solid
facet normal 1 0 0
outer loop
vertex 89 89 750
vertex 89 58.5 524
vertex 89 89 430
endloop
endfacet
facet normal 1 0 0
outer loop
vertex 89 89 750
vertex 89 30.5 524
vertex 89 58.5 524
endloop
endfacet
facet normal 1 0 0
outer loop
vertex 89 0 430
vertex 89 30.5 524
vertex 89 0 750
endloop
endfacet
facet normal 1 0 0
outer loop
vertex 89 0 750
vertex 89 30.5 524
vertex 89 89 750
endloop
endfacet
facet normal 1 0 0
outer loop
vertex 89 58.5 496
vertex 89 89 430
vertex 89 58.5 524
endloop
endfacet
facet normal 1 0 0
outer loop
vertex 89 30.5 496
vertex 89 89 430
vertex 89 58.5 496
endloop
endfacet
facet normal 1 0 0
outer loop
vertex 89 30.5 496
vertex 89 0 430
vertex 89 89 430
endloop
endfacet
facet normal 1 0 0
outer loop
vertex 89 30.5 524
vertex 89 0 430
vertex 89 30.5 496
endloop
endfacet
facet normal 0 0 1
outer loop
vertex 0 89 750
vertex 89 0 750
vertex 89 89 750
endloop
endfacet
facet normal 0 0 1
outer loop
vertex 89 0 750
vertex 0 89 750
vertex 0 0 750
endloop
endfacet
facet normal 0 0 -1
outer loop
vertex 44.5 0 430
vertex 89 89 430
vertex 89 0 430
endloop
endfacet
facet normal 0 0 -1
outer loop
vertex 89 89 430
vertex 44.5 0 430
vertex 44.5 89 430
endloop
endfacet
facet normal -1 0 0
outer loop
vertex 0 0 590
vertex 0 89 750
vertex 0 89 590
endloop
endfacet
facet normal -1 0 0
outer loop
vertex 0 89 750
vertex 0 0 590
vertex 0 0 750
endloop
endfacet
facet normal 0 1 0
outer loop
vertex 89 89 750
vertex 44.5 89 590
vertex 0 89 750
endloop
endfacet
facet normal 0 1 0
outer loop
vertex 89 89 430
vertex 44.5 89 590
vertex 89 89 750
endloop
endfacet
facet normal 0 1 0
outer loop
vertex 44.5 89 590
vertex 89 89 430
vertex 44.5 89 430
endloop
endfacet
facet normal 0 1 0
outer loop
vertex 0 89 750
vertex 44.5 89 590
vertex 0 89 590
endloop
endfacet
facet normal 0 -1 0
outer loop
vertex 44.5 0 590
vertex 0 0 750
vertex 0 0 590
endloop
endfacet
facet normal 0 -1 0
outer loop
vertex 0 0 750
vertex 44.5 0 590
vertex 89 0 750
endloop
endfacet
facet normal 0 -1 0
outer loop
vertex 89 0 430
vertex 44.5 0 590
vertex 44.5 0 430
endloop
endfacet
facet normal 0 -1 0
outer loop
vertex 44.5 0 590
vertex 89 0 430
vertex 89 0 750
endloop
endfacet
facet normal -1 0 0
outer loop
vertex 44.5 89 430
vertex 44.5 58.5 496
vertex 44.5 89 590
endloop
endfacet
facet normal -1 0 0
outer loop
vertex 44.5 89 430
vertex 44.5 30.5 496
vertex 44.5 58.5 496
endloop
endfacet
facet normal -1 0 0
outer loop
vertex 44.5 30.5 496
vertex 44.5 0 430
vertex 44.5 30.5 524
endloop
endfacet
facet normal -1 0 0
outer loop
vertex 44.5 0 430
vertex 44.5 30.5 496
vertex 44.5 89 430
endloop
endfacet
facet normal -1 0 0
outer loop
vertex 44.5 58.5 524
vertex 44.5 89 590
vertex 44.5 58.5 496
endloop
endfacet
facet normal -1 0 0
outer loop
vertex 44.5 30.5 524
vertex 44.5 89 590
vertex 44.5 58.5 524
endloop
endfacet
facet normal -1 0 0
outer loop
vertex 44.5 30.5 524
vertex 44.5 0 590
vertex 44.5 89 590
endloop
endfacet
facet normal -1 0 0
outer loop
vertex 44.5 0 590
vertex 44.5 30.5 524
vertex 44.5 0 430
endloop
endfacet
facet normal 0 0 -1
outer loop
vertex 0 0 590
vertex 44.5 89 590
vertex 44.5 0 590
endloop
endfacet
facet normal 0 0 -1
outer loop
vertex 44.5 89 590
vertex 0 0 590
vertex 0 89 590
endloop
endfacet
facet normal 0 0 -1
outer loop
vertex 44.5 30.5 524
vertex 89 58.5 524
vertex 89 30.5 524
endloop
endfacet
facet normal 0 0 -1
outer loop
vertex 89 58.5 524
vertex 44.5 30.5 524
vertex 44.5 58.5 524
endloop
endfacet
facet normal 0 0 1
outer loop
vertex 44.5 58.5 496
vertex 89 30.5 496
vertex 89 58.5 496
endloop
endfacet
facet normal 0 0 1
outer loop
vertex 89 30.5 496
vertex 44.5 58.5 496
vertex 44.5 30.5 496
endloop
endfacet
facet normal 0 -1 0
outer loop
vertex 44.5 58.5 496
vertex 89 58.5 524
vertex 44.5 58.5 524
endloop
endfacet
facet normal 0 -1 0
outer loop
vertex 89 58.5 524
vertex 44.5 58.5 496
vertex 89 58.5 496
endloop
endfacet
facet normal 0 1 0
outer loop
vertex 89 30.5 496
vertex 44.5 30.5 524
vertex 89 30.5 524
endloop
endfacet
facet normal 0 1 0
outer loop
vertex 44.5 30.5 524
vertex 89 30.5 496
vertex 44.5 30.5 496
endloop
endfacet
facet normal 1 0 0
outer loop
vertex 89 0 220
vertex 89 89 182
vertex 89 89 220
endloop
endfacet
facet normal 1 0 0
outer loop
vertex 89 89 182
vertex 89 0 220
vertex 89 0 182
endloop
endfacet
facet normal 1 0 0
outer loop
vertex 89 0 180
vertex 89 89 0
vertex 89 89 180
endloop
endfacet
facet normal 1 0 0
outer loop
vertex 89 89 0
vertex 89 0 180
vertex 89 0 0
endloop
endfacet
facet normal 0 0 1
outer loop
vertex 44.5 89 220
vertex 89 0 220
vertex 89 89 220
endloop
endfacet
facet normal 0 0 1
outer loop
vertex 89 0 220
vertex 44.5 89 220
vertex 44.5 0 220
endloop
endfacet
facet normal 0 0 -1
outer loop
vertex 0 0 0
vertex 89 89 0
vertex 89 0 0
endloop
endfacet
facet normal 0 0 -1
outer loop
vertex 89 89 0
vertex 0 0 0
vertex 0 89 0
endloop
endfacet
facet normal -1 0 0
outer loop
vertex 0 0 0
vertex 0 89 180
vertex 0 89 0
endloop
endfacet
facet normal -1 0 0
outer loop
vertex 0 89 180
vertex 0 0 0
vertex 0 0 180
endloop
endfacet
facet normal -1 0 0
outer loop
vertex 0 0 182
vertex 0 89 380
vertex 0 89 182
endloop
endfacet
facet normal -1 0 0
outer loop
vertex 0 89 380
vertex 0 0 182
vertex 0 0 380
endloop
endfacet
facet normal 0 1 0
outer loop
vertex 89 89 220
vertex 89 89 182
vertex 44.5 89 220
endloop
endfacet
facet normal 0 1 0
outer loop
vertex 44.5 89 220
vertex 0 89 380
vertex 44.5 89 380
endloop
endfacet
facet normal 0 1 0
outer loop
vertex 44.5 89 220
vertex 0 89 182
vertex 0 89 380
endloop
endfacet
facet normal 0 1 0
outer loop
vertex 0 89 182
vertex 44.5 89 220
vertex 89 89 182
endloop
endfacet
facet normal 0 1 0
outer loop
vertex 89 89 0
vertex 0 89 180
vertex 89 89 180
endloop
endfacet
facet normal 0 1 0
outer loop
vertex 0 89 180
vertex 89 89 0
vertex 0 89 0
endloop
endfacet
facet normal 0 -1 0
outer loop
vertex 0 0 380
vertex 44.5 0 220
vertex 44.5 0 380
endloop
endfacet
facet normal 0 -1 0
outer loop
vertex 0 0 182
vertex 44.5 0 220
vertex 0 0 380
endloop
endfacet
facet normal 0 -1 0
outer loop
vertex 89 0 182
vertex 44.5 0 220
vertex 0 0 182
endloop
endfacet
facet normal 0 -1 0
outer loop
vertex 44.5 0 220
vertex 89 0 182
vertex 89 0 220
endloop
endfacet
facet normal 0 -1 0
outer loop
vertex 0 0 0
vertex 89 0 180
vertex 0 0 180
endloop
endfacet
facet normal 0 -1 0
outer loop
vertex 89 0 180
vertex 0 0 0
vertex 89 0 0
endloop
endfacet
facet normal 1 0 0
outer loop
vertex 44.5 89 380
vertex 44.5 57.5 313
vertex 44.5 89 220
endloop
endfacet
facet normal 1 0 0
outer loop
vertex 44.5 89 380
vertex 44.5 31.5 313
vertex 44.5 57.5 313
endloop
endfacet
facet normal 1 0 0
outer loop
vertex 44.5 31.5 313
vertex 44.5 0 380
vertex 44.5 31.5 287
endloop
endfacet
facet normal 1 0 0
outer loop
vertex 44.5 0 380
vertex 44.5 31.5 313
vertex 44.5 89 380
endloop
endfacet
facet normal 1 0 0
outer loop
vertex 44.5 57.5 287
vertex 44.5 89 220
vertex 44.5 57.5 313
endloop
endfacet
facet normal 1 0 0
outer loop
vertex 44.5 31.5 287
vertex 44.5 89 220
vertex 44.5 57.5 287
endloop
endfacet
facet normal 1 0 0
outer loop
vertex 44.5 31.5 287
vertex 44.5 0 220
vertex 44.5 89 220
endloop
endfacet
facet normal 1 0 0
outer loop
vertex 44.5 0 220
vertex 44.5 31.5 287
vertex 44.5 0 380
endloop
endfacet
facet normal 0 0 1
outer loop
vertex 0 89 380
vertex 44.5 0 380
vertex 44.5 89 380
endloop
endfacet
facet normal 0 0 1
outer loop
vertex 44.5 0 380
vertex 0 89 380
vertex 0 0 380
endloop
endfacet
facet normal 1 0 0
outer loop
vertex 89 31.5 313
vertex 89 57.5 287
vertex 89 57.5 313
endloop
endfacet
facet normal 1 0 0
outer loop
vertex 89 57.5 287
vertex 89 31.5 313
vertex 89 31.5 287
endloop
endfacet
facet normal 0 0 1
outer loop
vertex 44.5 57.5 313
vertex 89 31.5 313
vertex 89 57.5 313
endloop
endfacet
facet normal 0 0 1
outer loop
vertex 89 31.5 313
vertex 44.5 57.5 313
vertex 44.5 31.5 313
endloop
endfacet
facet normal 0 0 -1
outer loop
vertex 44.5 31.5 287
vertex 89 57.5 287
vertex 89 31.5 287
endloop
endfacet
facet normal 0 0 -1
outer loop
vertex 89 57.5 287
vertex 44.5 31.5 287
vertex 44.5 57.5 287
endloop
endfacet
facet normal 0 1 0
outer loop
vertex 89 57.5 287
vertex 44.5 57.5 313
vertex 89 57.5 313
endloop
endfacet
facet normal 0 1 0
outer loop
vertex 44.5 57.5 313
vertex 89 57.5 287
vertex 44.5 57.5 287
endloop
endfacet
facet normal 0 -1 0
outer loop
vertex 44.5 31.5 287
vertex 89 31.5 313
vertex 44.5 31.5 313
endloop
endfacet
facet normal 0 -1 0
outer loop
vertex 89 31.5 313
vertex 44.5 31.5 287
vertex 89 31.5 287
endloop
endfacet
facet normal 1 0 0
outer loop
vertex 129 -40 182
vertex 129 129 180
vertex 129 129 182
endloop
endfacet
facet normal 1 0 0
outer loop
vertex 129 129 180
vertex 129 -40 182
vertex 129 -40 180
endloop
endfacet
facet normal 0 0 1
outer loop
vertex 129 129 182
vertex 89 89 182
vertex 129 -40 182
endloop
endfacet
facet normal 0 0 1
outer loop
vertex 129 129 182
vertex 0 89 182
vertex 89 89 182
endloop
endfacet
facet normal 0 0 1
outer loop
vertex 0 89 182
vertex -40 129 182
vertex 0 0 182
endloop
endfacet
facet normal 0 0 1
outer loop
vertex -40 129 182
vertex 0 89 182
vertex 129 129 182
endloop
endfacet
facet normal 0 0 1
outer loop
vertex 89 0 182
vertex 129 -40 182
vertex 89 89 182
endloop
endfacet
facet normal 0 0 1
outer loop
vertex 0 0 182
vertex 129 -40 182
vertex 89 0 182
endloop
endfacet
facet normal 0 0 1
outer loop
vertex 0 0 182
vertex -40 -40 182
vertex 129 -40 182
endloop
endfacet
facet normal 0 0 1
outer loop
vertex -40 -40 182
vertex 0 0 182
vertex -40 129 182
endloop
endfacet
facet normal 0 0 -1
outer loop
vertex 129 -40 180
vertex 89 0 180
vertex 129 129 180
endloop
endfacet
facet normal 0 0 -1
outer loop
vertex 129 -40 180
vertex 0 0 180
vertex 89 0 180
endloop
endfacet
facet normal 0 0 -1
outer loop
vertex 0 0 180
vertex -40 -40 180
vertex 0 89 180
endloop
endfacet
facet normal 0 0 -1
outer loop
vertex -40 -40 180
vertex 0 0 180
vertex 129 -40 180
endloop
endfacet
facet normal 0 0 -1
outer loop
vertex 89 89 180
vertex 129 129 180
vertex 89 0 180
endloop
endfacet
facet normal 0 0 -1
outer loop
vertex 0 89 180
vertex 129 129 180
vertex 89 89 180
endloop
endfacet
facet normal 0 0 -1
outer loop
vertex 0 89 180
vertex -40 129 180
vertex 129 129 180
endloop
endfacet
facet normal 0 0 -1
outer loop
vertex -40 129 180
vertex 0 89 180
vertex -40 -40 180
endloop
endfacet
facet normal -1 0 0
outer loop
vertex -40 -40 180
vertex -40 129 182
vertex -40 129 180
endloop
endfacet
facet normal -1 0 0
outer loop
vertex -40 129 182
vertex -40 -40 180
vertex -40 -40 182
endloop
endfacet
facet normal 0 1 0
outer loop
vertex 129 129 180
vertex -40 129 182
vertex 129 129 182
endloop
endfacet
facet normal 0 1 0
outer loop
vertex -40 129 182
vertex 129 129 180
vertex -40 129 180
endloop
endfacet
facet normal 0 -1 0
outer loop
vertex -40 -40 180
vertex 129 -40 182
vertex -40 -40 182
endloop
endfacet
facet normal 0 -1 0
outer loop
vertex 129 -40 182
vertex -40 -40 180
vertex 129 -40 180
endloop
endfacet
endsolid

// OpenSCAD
// file: hashira_lib.scad
// HASHIRA — shared dimensions (mm)
// Tunable via -D on the command line / OpenSCAD MCP variables

post_w = 89;          // ~3.5" nominal 4x4
post_d = 89;
post_h = 1800;        // above-grade height shown
rail_w = 89;          // rail width (through post face)
rail_t = 38;          // rail thickness
rail_len = 1800;      // bay center-to-center approx
bay_cc = 1800;        // post center spacing
cap_overhang = 18;
cap_h = 28;

// rail elevations from post bottom (above grade in model)
rail_z_low = 200;
rail_z_mid = 900;
rail_z_top = 1500;

ease = 1.2;           // seasonal mortise ease
peg_d = 10;
wood_post = [0.55, 0.35, 0.18];
wood_rail = [0.42, 0.52, 0.34];
wood_peg  = [0.72, 0.62, 0.42];

module hashira_post(h=post_h, w=post_w, d=post_d) {
  color(wood_post) cube([w, d, h], center=false);
}

module hashira_cap(w=post_w, d=post_d, oh=cap_overhang, h=cap_h) {
  color([0.88, 0.85, 0.78])
  translate([-oh, -oh, 0])
    linear_extrude(height=h, scale=0.72)
      square([w + 2*oh, d + 2*oh], center=false);
}

module nuki_rail(len=rail_len, w=rail_w, t=rail_t) {
  color(wood_rail) cube([len, w, t], center=false);
}

module peg(h=post_d + 20, d=peg_d) {
  color(wood_peg) cylinder(h=h, d=d, $fn=24);
}
// main file
// Ne-tsugi 根継ぎ — foot splice for rotten post butts
include <hashira_lib.scad>

exploded = 1;
splice_h = 160;
hook = 28;
explode_gap = 50;

module upper_post() {
  difference() {
    cube([post_w, post_d, 320]);
    // female scarf pocket
    translate([-1, -1, 0])
      cube([post_w/2 + 1, post_d + 2, splice_h]);
    translate([post_w/2 - 1, post_d/2 - hook/2, splice_h/2 - hook/2])
      cube([post_w/2 + 2, hook, hook]);
  }
}

module lower_stub() {
  union() {
    cube([post_w, post_d, 220]);
    // male scarf
    translate([0, 0, 220])
      cube([post_w/2, post_d, splice_h]);
    translate([post_w/2, post_d/2 - (hook - 2)/2, 220 + splice_h/2 - (hook - 2)/2])
      cube([post_w/2, hook - 2, hook - 2]);
  }
}

module ne_tsugi_assembly() {
  color(wood_post) translate([0, 0, exploded ? 220 + splice_h + explode_gap : 220])
    upper_post();
  color(wood_rail) lower_stub();
  // grade line marker
  color([0.36, 0.48, 0.30])
    translate([-40, -40, 180])
      cube([post_w + 80, post_d + 80, 2]);
}

ne_tsugi_assembly();
